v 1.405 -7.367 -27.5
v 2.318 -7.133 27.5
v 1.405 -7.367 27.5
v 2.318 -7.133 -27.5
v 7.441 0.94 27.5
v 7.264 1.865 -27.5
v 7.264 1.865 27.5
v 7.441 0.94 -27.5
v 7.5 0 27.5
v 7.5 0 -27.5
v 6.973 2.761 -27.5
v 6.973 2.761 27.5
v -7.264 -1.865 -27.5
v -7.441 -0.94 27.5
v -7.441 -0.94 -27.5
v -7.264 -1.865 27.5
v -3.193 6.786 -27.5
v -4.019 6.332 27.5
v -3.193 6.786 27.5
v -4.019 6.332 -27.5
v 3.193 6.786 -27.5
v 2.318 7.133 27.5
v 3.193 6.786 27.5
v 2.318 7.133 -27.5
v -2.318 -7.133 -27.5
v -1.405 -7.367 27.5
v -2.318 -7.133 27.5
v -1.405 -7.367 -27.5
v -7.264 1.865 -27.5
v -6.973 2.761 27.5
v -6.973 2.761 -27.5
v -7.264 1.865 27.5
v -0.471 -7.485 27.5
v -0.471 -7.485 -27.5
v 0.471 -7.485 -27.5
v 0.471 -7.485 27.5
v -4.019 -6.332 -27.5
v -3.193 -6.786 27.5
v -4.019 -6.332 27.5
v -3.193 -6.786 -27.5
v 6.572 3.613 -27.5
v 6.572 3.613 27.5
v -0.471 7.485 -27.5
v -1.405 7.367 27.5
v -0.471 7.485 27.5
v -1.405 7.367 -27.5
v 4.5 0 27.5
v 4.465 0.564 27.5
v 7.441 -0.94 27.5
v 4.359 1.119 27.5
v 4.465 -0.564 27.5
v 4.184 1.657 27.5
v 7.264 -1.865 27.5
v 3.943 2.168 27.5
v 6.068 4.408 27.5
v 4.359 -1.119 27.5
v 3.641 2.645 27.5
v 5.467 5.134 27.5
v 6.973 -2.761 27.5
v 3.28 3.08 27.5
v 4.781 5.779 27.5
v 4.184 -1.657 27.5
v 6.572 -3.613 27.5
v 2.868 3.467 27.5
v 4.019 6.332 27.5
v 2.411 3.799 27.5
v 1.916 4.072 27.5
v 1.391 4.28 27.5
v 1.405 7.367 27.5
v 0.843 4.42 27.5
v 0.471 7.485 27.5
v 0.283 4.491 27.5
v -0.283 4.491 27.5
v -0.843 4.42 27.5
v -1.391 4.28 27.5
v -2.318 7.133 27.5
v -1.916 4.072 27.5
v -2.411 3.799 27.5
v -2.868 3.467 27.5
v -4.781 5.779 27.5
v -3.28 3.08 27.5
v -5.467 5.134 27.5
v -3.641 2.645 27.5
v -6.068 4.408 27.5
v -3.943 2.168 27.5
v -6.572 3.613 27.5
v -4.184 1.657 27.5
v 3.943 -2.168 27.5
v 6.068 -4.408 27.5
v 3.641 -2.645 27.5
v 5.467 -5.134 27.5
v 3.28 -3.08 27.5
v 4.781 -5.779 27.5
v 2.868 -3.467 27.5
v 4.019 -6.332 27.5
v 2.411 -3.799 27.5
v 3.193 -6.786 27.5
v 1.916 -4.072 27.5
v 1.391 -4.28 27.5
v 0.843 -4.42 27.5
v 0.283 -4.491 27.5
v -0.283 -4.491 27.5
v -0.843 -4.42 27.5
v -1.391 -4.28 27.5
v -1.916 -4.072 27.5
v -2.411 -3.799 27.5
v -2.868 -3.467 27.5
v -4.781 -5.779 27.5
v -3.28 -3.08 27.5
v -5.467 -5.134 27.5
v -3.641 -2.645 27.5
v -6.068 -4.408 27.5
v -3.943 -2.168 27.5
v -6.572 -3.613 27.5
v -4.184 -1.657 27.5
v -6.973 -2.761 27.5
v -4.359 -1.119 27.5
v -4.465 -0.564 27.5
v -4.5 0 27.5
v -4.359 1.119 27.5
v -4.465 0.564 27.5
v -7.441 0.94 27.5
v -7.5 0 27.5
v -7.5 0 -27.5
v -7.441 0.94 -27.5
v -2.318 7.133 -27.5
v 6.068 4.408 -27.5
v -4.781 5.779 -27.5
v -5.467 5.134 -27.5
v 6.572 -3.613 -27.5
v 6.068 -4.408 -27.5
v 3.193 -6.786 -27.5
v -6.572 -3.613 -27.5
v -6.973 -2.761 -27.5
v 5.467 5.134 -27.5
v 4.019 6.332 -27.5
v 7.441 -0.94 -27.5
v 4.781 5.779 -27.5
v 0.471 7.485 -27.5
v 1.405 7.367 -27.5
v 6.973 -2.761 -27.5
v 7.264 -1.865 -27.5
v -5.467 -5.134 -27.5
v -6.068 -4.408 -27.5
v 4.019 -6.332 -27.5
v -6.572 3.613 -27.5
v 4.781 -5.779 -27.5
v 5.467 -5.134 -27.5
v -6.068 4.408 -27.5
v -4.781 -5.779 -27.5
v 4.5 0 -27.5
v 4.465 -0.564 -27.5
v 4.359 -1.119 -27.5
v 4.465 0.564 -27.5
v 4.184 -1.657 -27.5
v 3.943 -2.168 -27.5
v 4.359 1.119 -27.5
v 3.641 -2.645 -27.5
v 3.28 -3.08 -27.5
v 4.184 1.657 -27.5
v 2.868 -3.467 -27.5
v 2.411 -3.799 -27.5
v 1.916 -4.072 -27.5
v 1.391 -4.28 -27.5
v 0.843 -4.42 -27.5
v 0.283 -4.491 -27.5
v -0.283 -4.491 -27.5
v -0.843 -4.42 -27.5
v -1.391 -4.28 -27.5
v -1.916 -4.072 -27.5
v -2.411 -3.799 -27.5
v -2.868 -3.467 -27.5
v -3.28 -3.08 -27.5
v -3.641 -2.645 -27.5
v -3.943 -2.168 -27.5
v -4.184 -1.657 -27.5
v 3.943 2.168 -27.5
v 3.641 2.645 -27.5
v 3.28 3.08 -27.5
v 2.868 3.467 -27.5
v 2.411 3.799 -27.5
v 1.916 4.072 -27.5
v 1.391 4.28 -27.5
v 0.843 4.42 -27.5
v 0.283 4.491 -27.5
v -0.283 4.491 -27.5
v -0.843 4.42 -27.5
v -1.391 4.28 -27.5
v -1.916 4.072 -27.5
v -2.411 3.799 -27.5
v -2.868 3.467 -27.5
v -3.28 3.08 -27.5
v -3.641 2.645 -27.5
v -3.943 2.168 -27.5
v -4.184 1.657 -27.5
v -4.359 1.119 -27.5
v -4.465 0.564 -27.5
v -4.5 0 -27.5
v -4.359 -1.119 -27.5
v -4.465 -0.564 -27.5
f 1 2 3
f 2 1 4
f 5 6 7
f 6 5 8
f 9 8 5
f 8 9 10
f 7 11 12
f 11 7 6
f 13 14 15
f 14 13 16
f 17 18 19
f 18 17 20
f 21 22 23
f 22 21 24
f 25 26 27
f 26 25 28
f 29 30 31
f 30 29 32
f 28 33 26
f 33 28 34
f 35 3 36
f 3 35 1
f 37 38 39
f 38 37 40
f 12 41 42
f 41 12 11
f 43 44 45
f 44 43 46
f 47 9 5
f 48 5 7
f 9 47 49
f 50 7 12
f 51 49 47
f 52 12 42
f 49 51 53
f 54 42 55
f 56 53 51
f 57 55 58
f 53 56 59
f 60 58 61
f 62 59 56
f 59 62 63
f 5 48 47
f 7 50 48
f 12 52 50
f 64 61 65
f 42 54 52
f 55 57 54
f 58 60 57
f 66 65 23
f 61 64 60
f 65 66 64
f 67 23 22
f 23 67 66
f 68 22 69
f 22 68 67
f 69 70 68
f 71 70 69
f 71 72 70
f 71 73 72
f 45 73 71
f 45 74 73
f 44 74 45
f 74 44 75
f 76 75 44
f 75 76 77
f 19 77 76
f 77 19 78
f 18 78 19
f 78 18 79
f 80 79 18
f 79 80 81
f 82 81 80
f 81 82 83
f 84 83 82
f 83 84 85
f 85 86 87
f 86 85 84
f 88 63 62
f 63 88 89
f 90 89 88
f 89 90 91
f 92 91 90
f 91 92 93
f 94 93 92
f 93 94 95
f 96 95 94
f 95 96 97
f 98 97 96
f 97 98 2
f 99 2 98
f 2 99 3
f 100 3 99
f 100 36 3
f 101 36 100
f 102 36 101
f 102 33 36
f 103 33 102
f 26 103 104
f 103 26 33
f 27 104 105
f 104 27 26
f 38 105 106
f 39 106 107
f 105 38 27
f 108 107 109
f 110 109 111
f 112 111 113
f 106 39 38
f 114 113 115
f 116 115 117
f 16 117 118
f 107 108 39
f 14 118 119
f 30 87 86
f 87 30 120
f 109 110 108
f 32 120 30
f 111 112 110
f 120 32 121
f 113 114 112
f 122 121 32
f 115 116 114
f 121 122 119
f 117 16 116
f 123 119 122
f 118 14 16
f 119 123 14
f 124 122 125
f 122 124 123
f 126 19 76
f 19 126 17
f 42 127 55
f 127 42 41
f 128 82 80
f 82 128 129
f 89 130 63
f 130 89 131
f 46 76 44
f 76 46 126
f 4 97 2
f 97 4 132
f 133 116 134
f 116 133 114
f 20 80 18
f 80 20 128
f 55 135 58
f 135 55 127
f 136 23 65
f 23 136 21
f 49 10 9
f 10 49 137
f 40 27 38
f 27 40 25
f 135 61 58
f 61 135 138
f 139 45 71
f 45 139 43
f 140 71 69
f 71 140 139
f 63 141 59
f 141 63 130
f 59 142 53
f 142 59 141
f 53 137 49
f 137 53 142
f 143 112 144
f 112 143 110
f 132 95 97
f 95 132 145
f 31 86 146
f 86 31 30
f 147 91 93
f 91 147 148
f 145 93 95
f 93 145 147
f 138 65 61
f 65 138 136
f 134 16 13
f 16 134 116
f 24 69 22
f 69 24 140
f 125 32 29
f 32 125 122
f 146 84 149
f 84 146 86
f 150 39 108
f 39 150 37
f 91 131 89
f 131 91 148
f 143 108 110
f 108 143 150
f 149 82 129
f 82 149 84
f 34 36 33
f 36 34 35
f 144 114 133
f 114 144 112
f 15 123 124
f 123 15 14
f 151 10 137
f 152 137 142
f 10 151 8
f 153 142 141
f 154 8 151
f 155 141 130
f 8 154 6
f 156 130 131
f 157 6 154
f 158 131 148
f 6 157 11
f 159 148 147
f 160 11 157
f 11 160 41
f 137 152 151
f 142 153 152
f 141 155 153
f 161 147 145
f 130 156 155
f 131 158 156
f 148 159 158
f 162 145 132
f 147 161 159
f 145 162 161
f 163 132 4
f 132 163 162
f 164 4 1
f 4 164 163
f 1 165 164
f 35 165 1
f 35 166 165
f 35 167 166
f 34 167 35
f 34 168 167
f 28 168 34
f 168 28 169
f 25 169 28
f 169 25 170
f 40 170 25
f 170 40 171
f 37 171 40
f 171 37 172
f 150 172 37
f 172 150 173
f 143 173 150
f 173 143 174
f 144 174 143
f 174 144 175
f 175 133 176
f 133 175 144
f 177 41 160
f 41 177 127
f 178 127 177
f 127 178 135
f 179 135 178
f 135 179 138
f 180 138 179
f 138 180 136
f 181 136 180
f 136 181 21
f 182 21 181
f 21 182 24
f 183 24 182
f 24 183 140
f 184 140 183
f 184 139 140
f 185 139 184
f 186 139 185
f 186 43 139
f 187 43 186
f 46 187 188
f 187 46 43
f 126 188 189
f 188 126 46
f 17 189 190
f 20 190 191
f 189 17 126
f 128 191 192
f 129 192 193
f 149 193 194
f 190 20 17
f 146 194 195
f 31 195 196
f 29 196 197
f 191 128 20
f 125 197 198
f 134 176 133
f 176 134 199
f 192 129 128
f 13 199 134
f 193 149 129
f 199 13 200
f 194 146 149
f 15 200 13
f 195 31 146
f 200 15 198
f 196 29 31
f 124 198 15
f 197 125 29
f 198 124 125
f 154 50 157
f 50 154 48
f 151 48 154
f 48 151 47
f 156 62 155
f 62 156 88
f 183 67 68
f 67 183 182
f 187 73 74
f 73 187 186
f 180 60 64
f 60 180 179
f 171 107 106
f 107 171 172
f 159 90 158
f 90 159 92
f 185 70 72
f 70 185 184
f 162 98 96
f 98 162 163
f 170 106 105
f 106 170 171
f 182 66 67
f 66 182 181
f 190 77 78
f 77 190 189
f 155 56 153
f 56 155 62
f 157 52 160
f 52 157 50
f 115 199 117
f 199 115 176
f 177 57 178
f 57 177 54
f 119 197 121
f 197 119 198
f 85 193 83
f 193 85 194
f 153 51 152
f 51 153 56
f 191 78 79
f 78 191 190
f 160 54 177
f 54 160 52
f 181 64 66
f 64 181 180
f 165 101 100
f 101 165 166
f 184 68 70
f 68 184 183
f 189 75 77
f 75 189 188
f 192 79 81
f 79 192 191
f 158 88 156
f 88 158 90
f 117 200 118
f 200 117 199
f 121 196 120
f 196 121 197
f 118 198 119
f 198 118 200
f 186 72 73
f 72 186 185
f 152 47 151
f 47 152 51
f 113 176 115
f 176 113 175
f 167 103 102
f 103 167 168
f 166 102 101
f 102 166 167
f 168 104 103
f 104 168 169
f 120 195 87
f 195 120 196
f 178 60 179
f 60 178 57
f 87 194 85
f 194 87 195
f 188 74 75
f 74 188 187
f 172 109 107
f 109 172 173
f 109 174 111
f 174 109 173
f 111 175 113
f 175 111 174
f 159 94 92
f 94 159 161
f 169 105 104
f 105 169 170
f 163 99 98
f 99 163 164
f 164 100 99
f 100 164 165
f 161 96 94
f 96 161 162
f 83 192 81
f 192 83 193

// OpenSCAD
$fn = 50;


difference() {
	union() {
		translate(v = [0, 0, -27.5000000000]) {
			cylinder(h = 55, r = 7.5000000000);
		}
	}
	union() {
		translate(v = [0, 0, -100.0000000000]) {
			cylinder(h = 200, r = 4.5000000000);
		}
	}
}
